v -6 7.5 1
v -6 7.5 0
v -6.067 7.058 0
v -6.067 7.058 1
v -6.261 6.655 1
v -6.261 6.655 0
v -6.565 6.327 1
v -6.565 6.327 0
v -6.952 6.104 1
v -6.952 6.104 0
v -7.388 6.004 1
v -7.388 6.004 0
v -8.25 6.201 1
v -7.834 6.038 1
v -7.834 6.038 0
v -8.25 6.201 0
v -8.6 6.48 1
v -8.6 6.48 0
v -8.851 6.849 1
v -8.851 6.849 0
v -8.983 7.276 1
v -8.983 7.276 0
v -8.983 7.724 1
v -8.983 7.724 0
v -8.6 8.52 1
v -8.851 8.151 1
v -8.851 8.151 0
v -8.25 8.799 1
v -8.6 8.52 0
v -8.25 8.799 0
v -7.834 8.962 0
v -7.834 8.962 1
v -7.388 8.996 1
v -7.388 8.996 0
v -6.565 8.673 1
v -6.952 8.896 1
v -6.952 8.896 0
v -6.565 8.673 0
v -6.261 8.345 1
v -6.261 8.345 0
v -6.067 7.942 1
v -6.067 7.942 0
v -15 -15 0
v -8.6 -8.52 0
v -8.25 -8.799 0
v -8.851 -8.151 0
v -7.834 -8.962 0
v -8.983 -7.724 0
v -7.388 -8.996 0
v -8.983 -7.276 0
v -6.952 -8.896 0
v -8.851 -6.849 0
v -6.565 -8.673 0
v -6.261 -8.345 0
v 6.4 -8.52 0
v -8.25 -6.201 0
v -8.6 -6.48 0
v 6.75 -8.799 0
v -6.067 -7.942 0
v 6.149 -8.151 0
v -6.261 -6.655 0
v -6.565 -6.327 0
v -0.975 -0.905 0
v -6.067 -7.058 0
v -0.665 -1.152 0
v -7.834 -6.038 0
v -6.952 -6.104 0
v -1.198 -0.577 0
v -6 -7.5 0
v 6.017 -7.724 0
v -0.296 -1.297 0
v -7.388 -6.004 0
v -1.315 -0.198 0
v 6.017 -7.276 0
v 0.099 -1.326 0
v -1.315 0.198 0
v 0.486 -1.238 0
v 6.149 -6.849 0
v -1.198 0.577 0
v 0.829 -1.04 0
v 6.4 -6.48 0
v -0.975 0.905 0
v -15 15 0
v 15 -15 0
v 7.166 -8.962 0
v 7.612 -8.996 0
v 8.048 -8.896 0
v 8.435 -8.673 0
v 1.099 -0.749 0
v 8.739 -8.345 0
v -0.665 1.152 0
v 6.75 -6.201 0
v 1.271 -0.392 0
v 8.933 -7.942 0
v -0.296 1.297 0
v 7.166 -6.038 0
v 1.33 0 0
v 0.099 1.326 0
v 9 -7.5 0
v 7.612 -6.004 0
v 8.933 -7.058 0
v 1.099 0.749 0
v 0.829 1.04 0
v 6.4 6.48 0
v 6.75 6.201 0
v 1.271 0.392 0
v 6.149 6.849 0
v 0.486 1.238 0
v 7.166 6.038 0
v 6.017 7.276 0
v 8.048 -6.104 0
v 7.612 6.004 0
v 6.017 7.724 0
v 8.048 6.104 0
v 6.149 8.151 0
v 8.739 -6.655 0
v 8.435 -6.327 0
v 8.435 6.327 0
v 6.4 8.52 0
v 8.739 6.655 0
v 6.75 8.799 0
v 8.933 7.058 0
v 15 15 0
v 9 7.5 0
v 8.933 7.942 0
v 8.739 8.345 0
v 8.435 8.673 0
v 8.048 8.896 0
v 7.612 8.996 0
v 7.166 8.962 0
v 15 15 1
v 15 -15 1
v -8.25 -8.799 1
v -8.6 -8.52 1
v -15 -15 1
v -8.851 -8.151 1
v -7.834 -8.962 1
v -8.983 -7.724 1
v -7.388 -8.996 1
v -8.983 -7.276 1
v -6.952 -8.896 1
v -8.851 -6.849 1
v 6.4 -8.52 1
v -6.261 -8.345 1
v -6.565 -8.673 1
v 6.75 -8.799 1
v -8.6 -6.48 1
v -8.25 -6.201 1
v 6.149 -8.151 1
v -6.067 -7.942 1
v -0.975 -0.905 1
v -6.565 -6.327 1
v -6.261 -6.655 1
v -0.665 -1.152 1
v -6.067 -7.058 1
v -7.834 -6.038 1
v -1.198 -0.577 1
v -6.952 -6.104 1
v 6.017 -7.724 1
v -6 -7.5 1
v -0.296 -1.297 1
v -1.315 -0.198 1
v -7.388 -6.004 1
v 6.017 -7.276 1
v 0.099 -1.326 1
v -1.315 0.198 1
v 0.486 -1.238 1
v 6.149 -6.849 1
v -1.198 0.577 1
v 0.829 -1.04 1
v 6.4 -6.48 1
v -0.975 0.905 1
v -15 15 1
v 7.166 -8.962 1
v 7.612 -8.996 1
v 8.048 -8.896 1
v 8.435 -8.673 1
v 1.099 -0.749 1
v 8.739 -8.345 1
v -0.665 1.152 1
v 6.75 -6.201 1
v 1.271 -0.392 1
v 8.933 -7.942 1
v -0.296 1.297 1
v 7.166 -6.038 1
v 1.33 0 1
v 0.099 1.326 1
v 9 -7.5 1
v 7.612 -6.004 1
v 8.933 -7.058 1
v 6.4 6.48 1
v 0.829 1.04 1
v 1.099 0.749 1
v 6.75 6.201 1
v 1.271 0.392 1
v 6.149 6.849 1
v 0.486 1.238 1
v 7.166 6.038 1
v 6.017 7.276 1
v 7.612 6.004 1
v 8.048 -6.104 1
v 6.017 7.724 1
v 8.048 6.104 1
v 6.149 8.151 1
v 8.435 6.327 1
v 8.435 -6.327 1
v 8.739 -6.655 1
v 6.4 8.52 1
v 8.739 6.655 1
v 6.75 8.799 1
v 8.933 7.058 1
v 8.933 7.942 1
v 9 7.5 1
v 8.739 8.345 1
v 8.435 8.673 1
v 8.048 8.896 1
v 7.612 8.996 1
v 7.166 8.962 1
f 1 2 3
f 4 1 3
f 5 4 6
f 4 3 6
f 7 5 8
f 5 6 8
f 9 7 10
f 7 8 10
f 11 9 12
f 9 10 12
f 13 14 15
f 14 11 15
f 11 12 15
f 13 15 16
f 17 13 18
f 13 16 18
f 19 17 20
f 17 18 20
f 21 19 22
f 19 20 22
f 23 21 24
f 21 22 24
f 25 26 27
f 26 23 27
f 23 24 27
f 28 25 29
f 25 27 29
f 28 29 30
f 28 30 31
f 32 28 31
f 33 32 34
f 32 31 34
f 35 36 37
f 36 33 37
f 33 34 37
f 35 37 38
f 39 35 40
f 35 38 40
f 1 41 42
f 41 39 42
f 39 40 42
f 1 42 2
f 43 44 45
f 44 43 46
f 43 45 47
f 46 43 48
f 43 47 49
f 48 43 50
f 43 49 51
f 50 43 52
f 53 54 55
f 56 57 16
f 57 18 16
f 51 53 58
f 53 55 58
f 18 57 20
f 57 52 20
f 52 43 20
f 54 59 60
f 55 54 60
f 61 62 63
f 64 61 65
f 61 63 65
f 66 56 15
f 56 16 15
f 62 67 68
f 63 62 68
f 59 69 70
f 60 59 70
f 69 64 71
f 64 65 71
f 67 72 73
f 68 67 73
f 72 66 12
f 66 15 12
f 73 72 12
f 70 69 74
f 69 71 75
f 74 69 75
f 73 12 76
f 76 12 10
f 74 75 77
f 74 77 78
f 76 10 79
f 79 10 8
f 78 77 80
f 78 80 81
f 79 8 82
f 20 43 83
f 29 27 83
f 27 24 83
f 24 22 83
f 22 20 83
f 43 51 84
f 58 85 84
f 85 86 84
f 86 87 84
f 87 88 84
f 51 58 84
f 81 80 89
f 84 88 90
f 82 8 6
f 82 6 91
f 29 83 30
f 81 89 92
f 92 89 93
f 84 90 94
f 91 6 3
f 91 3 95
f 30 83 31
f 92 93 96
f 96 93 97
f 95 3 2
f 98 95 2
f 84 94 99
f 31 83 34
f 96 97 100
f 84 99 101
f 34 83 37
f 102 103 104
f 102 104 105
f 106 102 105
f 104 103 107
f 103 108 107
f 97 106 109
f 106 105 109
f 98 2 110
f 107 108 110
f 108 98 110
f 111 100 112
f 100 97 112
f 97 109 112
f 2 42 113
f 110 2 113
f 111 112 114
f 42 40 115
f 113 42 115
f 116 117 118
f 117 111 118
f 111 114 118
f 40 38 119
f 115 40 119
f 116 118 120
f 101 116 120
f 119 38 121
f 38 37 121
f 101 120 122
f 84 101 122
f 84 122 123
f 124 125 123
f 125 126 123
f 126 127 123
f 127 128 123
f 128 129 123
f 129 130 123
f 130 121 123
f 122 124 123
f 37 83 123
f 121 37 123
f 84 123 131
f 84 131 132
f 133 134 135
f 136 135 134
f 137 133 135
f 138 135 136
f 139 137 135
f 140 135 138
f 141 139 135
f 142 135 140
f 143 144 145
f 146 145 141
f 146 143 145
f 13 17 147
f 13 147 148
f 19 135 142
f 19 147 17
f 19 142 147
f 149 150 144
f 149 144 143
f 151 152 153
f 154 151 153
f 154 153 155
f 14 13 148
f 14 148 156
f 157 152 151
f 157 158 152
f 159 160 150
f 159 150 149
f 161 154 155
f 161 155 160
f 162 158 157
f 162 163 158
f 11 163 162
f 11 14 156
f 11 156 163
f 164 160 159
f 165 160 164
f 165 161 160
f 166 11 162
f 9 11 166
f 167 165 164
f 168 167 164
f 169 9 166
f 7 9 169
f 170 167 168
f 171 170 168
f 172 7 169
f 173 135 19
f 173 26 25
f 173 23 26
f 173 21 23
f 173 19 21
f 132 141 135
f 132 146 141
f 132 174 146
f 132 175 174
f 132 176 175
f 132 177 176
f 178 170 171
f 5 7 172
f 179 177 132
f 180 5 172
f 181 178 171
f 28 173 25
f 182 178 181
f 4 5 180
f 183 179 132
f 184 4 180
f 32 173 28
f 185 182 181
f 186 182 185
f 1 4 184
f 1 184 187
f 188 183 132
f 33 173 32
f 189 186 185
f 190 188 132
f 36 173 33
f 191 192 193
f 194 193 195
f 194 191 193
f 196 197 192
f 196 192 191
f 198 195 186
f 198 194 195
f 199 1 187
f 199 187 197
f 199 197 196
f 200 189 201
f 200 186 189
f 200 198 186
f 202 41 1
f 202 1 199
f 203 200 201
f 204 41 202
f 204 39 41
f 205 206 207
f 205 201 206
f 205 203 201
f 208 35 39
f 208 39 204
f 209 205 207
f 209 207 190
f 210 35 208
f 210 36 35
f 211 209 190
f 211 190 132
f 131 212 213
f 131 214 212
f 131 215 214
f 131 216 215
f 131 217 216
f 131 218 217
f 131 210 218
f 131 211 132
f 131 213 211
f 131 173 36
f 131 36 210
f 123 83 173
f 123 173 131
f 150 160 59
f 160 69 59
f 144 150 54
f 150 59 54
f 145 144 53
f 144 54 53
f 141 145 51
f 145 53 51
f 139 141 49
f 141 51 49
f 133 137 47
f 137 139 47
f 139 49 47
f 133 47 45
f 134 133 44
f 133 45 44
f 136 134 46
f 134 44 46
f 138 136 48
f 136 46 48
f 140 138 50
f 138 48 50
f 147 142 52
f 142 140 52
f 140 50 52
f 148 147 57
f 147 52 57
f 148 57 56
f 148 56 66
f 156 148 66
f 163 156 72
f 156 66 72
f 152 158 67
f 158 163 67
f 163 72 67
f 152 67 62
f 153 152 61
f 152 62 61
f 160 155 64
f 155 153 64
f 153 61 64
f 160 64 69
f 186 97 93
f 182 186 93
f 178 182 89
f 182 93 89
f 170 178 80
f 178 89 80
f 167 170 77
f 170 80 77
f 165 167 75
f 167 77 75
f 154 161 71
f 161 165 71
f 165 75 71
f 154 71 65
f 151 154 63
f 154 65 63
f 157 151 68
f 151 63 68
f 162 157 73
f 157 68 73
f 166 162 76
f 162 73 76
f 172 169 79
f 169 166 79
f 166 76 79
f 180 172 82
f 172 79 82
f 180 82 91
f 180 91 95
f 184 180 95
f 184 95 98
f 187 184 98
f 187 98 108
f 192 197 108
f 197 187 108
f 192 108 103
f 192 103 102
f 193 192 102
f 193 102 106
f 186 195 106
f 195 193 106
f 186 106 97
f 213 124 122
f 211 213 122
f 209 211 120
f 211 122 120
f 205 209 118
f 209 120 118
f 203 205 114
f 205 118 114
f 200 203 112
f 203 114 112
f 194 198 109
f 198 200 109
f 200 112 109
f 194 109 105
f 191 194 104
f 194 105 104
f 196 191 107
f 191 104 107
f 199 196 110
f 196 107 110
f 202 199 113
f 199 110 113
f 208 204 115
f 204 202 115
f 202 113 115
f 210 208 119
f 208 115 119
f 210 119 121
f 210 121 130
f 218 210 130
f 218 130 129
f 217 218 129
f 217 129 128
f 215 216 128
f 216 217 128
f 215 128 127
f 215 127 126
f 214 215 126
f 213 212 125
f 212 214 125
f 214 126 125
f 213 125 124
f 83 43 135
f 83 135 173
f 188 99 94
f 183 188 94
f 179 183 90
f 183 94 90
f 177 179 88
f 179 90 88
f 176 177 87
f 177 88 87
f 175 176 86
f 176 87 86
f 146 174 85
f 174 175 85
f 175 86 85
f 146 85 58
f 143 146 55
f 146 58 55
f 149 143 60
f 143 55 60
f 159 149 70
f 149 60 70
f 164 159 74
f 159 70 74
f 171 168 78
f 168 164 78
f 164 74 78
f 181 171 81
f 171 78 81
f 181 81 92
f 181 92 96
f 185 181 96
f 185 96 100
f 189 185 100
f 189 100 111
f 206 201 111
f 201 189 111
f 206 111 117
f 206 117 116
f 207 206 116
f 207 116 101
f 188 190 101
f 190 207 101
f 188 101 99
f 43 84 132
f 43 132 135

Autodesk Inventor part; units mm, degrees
ref_plane "YZ Plane" through (0, 0, 0) normal (1, 0, 0) x (0, 1, 0)
ref_plane "XZ Plane" through (0, 0, 0) normal (0, 1, 0) x (-1, 0, 0)
ref_plane "XY Plane" through (0, 0, 0) normal (0, 0, 1) x (1, 0, 0)
sketch "Skizze1" plane through (0, 0, 0) normal (0, 0, 1) x (1, 0, 0)
  line L0 (15, -15) -> (-15, -15)
  line L1 (-15, -15) -> (-15, 15)
  line L2 (-15, 15) -> (15, 15)
  line L3 (15, 15) -> (15, -15)
  line L4 (15, -15) -> (-15, 15) construction
  line L5 (-15, -15) -> (15, 15) construction
  line L6 (-7.5, -7.5) -> (7.5, -7.5) construction
  line L7 (7.5, -7.5) -> (7.5, 7.5) construction
  line L8 (7.5, 7.5) -> (-7.5, 7.5) construction
  line L9 (-7.5, 7.5) -> (-7.5, -7.5) construction
  line L10 (-7.5, -7.5) -> (7.5, 7.5) construction
  line L11 (7.5, -7.5) -> (-7.5, 7.5) construction
  circle A0 centre (-7.5, 7.5) radius 1.5
  circle A1 centre (7.5, 7.5) radius 1.5
  circle A2 centre (7.5, -7.5) radius 1.5
  circle A3 centre (-7.5, -7.5) radius 1.5
  circle A4 centre (0, 0) radius 1.3301
  dimension "d0" = 30
  dimension "d1" = 30
  dimension "d2" = 15
  dimension "d3" = 15
  dimension "d4" = 3
  dimension "d5" = 3
  dimension "d6" = 3
  dimension "d7" = 3
extrude "Extrusion1" add sketch "Skizze1" along normal blind 1
properties part number "00_Neopixel_4x4_Matrix"
